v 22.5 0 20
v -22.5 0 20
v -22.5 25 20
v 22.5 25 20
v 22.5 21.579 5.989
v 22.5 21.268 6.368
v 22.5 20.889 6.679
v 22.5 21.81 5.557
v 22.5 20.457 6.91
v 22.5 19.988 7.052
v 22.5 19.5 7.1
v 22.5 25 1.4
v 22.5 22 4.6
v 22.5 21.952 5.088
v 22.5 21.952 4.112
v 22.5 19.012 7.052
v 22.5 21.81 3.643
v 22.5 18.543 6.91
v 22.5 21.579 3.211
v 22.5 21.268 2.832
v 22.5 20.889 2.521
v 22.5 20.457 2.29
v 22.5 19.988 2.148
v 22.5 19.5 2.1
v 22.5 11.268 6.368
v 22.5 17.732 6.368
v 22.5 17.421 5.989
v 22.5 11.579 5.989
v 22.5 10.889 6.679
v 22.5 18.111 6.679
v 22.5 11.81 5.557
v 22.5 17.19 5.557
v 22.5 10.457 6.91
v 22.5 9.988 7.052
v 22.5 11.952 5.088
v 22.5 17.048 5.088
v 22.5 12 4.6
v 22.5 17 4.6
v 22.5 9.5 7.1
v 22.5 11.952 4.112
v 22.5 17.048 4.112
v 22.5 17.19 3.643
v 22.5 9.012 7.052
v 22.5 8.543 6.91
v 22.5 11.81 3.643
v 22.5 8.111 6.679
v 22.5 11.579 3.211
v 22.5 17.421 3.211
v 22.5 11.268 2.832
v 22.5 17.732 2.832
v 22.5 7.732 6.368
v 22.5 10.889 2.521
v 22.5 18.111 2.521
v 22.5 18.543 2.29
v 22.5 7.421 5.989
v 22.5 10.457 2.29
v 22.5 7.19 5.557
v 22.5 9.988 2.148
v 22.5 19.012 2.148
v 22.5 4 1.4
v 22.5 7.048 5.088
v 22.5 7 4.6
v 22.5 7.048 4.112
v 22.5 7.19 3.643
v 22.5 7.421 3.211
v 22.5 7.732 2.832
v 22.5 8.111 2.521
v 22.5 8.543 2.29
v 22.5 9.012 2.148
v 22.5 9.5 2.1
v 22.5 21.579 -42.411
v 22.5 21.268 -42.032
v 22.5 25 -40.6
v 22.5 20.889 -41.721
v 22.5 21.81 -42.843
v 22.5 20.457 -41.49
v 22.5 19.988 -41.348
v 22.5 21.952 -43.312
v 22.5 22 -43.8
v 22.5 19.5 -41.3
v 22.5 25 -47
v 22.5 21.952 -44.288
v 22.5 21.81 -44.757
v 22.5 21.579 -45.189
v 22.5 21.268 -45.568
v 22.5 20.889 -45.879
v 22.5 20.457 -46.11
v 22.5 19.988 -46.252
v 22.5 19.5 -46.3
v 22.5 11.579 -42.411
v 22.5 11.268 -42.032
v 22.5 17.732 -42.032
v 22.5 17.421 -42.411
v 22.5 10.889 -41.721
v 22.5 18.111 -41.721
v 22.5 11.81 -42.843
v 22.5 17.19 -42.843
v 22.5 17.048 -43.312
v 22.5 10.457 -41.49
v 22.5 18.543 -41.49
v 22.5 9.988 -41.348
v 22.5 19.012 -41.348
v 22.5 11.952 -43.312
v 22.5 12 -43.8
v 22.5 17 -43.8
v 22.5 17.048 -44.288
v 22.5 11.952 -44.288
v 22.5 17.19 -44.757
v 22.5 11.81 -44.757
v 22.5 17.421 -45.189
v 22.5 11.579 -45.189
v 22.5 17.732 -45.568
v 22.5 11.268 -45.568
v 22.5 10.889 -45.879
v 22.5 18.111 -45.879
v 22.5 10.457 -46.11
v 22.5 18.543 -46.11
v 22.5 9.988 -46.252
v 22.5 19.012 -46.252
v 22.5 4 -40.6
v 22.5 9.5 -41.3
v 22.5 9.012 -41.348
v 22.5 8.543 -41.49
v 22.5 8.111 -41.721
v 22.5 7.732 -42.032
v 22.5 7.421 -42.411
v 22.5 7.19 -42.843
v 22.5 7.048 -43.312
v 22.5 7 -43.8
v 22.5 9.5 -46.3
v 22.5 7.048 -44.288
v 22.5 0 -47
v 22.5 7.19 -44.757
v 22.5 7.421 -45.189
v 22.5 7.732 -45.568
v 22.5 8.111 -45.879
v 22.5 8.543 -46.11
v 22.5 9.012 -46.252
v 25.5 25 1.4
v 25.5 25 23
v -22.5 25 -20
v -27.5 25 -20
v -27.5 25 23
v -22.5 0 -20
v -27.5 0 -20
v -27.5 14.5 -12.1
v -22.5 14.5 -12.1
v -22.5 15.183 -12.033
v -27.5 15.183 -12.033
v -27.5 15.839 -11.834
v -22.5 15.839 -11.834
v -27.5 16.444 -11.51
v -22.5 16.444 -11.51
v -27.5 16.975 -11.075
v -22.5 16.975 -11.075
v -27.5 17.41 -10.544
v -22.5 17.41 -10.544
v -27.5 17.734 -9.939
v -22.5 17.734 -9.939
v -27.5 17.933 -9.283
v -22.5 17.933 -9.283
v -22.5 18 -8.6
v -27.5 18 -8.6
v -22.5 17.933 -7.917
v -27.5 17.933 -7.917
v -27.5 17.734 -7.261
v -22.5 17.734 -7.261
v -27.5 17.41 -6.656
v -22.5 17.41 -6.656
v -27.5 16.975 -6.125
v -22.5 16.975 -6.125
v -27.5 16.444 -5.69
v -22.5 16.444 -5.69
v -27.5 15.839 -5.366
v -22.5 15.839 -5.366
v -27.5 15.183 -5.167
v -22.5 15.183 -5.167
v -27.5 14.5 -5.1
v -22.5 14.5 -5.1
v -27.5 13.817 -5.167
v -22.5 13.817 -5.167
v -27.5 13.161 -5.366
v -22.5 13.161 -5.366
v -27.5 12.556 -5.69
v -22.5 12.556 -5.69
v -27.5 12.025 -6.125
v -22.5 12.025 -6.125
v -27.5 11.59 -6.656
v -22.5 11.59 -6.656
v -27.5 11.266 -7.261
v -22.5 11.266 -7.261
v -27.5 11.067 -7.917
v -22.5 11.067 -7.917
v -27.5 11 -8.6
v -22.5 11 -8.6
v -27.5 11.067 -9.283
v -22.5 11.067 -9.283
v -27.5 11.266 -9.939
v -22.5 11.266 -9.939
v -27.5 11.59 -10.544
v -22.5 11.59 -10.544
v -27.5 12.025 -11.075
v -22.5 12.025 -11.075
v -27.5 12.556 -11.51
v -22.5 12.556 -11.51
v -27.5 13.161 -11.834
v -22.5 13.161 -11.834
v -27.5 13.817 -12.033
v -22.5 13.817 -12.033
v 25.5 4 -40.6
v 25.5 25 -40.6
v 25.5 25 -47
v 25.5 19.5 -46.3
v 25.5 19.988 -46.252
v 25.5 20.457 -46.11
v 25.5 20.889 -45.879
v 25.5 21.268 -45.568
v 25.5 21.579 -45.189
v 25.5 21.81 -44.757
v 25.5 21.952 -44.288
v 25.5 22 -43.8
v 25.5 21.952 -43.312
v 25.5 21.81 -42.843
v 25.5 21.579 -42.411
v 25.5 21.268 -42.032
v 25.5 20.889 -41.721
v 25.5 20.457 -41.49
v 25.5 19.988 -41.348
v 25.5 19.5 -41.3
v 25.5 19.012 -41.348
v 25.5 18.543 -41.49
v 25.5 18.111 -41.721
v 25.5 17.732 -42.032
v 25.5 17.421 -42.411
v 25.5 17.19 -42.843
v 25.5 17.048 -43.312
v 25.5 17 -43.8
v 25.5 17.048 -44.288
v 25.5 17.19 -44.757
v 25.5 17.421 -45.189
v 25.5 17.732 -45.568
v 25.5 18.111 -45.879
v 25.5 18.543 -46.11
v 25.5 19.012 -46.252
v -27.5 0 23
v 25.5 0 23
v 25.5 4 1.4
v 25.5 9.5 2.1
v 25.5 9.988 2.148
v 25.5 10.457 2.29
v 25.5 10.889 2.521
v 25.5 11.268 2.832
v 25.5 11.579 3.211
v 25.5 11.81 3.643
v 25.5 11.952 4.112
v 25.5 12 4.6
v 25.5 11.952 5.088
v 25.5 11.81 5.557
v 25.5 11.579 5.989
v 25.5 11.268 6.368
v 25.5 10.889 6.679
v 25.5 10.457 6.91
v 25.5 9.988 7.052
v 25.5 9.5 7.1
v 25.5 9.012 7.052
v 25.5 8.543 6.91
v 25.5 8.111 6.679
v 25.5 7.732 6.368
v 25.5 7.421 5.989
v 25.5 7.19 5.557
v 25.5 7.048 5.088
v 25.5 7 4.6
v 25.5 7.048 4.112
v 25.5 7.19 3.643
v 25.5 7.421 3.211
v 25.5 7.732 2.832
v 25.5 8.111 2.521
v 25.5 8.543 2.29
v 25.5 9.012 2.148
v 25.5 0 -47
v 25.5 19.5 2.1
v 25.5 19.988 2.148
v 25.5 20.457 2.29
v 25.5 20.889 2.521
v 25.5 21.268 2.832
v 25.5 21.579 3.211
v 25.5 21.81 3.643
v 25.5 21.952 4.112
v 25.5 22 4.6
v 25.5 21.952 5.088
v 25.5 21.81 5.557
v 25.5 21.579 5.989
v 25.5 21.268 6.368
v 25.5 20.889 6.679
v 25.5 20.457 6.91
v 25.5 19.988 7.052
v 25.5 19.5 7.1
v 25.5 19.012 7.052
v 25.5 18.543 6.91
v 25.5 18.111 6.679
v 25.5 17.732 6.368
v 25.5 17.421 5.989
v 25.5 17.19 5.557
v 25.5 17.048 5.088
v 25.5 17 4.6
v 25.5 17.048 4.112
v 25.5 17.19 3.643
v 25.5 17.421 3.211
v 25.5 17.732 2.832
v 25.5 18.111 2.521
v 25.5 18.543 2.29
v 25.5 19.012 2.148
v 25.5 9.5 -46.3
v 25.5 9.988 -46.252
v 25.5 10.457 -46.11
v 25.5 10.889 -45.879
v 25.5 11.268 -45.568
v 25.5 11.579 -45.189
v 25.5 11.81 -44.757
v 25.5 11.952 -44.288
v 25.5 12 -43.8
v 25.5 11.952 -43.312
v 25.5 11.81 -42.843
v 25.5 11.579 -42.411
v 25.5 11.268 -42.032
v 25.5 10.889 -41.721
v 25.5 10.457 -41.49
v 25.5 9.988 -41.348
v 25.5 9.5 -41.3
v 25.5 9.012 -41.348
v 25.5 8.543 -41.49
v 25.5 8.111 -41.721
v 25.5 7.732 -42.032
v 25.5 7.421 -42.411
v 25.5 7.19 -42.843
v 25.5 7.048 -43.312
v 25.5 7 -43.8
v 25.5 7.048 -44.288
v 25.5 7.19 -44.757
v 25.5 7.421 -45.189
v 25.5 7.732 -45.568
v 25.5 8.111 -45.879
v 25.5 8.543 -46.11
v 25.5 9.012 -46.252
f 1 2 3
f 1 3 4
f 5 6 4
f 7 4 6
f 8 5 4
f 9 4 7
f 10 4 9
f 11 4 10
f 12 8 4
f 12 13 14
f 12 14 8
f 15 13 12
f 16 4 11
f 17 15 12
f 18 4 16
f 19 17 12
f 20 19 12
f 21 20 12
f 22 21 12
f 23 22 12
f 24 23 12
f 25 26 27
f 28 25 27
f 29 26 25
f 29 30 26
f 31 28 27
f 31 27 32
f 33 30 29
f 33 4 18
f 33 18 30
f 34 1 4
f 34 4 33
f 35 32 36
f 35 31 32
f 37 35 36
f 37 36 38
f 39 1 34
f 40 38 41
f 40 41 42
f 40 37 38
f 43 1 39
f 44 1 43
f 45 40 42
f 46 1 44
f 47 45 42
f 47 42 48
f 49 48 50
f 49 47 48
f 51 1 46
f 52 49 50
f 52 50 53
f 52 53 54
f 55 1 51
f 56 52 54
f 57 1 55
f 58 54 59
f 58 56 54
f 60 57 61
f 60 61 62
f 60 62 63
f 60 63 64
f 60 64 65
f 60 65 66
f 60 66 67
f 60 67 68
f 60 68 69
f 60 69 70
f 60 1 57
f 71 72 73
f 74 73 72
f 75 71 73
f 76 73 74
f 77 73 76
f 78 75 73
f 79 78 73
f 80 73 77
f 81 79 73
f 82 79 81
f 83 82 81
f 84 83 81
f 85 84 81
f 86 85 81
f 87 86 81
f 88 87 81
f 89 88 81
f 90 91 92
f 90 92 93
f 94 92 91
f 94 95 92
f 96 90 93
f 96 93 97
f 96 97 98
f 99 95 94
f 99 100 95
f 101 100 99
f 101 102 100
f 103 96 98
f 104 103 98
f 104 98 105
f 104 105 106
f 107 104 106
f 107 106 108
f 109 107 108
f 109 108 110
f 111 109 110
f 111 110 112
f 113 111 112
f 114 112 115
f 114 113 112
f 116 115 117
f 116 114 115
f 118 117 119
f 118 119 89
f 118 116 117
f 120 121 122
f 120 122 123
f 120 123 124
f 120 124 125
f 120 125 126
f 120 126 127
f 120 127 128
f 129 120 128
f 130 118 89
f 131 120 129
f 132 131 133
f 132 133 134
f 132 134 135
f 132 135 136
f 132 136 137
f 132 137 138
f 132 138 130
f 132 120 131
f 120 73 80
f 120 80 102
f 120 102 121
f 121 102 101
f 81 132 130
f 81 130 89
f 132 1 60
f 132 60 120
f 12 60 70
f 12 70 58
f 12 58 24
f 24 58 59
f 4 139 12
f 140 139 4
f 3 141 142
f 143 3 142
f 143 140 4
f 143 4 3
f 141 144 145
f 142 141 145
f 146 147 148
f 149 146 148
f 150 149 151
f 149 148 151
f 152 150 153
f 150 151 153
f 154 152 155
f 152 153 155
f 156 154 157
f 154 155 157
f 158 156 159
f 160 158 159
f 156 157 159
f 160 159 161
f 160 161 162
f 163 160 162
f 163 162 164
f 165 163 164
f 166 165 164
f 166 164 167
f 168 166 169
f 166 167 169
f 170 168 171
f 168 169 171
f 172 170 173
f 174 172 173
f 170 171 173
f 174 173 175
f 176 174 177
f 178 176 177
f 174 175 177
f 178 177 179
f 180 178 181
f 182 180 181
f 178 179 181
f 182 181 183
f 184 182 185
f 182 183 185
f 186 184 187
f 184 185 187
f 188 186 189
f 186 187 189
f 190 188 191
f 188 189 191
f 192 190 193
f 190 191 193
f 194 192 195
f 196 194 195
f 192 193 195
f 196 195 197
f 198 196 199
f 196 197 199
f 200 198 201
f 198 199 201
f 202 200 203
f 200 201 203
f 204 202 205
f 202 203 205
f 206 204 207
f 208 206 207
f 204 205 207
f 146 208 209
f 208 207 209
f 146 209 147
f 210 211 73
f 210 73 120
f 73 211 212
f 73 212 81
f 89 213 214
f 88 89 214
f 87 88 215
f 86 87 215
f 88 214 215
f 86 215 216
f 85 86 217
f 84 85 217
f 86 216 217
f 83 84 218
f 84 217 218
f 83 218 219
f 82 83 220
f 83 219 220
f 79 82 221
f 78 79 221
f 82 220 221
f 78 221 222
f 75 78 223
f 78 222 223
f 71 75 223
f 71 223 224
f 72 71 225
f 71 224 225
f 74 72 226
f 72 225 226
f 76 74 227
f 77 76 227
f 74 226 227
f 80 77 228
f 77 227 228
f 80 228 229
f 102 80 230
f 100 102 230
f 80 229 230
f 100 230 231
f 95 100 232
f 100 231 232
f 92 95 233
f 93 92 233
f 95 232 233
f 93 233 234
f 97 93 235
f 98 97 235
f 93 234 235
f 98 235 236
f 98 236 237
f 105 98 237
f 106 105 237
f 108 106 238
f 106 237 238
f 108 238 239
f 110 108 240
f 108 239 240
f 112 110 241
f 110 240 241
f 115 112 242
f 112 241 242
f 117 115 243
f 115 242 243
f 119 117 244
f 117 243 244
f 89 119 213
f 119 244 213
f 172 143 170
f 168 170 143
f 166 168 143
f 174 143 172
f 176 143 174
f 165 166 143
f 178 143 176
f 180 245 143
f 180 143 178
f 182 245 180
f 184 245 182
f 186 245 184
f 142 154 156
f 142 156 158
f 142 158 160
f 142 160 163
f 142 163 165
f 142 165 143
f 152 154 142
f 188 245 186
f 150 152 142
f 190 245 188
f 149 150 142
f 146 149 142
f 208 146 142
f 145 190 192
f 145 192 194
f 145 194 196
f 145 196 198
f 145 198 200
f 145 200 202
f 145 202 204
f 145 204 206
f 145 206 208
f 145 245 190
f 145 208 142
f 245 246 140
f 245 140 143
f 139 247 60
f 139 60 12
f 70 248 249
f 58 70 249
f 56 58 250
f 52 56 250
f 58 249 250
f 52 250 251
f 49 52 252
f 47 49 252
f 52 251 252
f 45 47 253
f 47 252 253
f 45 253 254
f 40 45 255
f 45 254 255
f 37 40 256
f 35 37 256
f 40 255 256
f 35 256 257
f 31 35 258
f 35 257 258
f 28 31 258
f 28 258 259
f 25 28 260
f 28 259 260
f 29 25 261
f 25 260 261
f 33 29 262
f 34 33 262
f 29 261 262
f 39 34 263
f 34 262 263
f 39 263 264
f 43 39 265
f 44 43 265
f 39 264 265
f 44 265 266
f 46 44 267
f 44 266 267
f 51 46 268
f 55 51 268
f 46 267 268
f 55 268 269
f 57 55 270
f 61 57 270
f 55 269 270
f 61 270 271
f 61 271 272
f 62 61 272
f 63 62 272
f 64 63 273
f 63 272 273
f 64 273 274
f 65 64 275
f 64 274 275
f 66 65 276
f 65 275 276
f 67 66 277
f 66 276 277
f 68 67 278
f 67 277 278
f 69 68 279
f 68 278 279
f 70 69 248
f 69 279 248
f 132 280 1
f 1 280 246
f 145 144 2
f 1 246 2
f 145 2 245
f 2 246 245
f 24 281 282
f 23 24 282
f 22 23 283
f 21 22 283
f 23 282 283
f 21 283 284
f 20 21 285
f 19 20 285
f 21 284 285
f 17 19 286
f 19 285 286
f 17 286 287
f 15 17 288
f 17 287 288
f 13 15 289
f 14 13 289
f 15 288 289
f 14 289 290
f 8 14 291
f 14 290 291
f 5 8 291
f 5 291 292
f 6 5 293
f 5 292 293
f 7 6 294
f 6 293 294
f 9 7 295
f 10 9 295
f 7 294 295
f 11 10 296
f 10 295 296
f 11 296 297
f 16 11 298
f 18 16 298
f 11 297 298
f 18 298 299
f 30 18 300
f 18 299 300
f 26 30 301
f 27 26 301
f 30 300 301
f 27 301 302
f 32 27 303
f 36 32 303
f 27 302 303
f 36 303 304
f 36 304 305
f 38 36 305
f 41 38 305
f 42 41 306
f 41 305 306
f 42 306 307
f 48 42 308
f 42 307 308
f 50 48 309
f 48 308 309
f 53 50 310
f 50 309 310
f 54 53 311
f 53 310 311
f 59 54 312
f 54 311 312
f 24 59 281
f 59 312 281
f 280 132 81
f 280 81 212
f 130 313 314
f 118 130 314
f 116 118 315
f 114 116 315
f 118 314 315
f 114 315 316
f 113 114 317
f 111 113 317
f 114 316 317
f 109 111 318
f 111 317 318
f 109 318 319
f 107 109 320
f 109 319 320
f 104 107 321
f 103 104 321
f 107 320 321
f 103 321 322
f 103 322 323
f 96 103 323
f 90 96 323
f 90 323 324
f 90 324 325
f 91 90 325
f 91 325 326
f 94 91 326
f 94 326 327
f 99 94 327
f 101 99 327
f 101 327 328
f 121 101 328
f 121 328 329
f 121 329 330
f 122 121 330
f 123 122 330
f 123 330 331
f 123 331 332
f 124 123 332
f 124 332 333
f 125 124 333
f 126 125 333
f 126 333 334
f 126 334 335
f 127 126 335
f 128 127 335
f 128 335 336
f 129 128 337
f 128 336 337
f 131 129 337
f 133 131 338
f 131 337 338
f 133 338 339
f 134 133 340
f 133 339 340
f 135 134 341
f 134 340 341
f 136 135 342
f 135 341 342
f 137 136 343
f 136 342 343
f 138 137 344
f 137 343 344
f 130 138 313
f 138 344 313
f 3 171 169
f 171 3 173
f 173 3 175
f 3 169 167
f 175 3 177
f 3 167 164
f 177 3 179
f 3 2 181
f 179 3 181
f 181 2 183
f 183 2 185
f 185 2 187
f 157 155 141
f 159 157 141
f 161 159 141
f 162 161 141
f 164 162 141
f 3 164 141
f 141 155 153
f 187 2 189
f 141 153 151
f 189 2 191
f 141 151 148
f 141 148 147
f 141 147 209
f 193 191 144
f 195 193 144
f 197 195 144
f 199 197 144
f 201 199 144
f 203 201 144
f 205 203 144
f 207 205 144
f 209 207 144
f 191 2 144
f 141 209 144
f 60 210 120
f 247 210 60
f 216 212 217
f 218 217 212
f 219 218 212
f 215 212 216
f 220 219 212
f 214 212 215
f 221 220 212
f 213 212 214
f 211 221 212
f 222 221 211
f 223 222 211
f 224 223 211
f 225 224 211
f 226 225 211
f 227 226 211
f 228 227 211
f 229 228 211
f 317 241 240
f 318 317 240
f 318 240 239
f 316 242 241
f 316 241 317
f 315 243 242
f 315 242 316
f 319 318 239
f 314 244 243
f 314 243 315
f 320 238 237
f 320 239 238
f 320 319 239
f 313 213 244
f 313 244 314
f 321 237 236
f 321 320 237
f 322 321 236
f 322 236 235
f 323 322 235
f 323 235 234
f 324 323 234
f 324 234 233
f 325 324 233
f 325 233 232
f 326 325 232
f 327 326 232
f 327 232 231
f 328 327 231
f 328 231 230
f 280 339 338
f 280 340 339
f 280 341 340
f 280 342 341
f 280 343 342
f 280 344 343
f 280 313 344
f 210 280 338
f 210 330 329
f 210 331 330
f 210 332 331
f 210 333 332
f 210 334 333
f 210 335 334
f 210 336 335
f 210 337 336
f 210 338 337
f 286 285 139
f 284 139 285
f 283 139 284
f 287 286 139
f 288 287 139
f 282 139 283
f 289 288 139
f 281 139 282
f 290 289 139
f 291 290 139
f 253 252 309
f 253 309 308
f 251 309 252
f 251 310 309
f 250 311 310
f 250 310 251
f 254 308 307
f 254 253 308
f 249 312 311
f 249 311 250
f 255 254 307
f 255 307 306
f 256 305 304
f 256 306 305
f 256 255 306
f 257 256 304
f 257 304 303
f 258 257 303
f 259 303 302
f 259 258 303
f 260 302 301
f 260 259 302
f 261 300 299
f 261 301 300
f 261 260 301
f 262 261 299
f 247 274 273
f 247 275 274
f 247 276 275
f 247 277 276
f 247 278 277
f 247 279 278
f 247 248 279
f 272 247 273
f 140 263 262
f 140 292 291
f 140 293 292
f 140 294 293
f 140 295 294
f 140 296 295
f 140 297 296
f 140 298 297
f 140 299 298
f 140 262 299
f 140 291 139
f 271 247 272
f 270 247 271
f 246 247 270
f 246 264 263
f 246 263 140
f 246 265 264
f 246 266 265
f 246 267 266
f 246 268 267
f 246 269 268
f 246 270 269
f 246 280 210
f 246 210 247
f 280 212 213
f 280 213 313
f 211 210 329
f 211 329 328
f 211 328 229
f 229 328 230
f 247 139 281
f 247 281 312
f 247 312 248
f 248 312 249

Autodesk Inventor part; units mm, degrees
ref_plane "YZ Plane" through (0, 0, 0) normal (1, 0, 0) x (0, 1, 0)
ref_plane "XZ Plane" through (0, 0, 0) normal (0, 1, 0) x (-1, 0, 0)
ref_plane "XY Plane" through (0, 0, 0) normal (0, 0, 1) x (1, 0, 0)
sketch "Esquisse1" plane through (0, 0, 0) normal (0, 1, 0) x (-1, 0, 0)
  line L0 (-25.5, 23) -> (-22.5, 23)
  line L1 (-22.5, 23) -> (-22.5, -47)
  line L2 (-22.5, -47) -> (-25.5, -47)
  line L3 (-25.5, -47) -> (-25.5, 23)
  line L4 (-22.5, 23) -> (27.5, 23)
  line L5 (27.5, 23) -> (27.5, 20)
  line L6 (27.5, 20) -> (-22.5, 20)
  line L7 (-22.5, 20) -> (-22.5, 23)
  line L8 (27.5, 20) -> (22.5, 20)
  line L9 (22.5, 20) -> (22.5, -20)
  line L10 (22.5, -20) -> (27.5, -20)
  line L11 (27.5, -20) -> (27.5, 20)
  point P0 (0, 0)
  dimension "d0" = 45
  dimension "d1" = 5
  dimension "d2" = 3
  dimension "d3" = 3
  dimension "d4" = 40
  dimension "d5" = 20
  dimension "d6" = 22.5
  dimension "d7" = 70
extrude "Extrusion1" add sketch "Esquisse1" along normal blind 25
sketch "Esquisse2" plane through (25.5, 0, 23) normal (1, 0, 0) x (0, 0, -1)
  line L0 (70, 0) -> (70, 25) projected
  line L1 (0, 25) -> (70, 25) projected
  line L2 (70, 25) -> (63.6, 25)
  line L3 (63.6, 25) -> (63.6, 4)
  line L4 (63.6, 4) -> (70, 4)
  line L5 (70, 4) -> (70, 25)
  line L6 (63.6, 4) -> (21.6, 4)
  line L7 (21.6, 4) -> (21.6, 25)
  line L8 (21.6, 25) -> (63.6, 25)
  line L9 (63.6, 25) -> (63.6, 4)
  line L10 (21.6, 4) -> (15.2, 4)
  line L11 (15.2, 4) -> (15.2, 25)
  line L12 (15.2, 25) -> (21.6, 25)
  line L13 (21.6, 25) -> (21.6, 4)
  line L14 (15.2, 14.5) -> (70, 14.5) construction
  circle A0 centre (18.4, 19.5) radius 2.5
  circle A1 centre (66.8, 19.5) radius 2.5
  circle A2 centre (18.4, 9.5) radius 2.5
  circle A3 centre (66.8, 9.5) radius 2.5
  point P0 (23, 0)
  dimension "d10" = 21
  dimension "d11" = 6.4
  dimension "d12" = 6.4
  dimension "d13" = 42
  dimension "d14" = 5
  dimension "d15" = 5
  dimension "d16" = 5
  dimension "d17" = 3.2
  dimension "d18" = 3.2
  dimension "d19" = 5
sketch "Esquisse3" plane through (25.5, 0, 23) normal (1, 0, 0) x (0, 0, -1)
  line L0 (0, 25) -> (70, 25) projected
  line L1 (21.6, 4) -> (63.6, 4)
  line L2 (63.6, 4) -> (63.6, 25)
  line L3 (63.6, 25) -> (21.6, 25)
  line L4 (21.6, 25) -> (21.6, 4)
  line L5 (63.6, 4) -> (70, 4)
  line L6 (70, 4) -> (70, 25)
  line L7 (70, 25) -> (63.6, 25)
  line L8 (63.6, 25) -> (63.6, 4)
  line L9 (21.6, 14.5) -> (63.6, 14.5) construction
  circle A0 centre (31.6, 14.5) radius 3.5
  point P0 (23, 0)
  dimension "d22" = 6.4
  dimension "d23" = 21
  dimension "d24" = 42
  dimension "d25" = 7
  dimension "d27" = 10
extrude "Extrusion3" cut sketch "Esquisse3" against normal through all contours A0
extrude "Extrusion4" cut sketch "Esquisse2" against normal up to surface (3 mm away) contours L6 L7 L1 L3 | A0 | A1 | A2 | A3
equation "\"d5\" = 0.5 * d4"
equation "\"d6\" = 0.5 * d0"
equation "\"d12\" = d11"
equation "\"d15\" = d14"
equation "\"d18\" = d17"
equation "\"d19\" = d16"
properties part number "new_shoulder_2_modif"
